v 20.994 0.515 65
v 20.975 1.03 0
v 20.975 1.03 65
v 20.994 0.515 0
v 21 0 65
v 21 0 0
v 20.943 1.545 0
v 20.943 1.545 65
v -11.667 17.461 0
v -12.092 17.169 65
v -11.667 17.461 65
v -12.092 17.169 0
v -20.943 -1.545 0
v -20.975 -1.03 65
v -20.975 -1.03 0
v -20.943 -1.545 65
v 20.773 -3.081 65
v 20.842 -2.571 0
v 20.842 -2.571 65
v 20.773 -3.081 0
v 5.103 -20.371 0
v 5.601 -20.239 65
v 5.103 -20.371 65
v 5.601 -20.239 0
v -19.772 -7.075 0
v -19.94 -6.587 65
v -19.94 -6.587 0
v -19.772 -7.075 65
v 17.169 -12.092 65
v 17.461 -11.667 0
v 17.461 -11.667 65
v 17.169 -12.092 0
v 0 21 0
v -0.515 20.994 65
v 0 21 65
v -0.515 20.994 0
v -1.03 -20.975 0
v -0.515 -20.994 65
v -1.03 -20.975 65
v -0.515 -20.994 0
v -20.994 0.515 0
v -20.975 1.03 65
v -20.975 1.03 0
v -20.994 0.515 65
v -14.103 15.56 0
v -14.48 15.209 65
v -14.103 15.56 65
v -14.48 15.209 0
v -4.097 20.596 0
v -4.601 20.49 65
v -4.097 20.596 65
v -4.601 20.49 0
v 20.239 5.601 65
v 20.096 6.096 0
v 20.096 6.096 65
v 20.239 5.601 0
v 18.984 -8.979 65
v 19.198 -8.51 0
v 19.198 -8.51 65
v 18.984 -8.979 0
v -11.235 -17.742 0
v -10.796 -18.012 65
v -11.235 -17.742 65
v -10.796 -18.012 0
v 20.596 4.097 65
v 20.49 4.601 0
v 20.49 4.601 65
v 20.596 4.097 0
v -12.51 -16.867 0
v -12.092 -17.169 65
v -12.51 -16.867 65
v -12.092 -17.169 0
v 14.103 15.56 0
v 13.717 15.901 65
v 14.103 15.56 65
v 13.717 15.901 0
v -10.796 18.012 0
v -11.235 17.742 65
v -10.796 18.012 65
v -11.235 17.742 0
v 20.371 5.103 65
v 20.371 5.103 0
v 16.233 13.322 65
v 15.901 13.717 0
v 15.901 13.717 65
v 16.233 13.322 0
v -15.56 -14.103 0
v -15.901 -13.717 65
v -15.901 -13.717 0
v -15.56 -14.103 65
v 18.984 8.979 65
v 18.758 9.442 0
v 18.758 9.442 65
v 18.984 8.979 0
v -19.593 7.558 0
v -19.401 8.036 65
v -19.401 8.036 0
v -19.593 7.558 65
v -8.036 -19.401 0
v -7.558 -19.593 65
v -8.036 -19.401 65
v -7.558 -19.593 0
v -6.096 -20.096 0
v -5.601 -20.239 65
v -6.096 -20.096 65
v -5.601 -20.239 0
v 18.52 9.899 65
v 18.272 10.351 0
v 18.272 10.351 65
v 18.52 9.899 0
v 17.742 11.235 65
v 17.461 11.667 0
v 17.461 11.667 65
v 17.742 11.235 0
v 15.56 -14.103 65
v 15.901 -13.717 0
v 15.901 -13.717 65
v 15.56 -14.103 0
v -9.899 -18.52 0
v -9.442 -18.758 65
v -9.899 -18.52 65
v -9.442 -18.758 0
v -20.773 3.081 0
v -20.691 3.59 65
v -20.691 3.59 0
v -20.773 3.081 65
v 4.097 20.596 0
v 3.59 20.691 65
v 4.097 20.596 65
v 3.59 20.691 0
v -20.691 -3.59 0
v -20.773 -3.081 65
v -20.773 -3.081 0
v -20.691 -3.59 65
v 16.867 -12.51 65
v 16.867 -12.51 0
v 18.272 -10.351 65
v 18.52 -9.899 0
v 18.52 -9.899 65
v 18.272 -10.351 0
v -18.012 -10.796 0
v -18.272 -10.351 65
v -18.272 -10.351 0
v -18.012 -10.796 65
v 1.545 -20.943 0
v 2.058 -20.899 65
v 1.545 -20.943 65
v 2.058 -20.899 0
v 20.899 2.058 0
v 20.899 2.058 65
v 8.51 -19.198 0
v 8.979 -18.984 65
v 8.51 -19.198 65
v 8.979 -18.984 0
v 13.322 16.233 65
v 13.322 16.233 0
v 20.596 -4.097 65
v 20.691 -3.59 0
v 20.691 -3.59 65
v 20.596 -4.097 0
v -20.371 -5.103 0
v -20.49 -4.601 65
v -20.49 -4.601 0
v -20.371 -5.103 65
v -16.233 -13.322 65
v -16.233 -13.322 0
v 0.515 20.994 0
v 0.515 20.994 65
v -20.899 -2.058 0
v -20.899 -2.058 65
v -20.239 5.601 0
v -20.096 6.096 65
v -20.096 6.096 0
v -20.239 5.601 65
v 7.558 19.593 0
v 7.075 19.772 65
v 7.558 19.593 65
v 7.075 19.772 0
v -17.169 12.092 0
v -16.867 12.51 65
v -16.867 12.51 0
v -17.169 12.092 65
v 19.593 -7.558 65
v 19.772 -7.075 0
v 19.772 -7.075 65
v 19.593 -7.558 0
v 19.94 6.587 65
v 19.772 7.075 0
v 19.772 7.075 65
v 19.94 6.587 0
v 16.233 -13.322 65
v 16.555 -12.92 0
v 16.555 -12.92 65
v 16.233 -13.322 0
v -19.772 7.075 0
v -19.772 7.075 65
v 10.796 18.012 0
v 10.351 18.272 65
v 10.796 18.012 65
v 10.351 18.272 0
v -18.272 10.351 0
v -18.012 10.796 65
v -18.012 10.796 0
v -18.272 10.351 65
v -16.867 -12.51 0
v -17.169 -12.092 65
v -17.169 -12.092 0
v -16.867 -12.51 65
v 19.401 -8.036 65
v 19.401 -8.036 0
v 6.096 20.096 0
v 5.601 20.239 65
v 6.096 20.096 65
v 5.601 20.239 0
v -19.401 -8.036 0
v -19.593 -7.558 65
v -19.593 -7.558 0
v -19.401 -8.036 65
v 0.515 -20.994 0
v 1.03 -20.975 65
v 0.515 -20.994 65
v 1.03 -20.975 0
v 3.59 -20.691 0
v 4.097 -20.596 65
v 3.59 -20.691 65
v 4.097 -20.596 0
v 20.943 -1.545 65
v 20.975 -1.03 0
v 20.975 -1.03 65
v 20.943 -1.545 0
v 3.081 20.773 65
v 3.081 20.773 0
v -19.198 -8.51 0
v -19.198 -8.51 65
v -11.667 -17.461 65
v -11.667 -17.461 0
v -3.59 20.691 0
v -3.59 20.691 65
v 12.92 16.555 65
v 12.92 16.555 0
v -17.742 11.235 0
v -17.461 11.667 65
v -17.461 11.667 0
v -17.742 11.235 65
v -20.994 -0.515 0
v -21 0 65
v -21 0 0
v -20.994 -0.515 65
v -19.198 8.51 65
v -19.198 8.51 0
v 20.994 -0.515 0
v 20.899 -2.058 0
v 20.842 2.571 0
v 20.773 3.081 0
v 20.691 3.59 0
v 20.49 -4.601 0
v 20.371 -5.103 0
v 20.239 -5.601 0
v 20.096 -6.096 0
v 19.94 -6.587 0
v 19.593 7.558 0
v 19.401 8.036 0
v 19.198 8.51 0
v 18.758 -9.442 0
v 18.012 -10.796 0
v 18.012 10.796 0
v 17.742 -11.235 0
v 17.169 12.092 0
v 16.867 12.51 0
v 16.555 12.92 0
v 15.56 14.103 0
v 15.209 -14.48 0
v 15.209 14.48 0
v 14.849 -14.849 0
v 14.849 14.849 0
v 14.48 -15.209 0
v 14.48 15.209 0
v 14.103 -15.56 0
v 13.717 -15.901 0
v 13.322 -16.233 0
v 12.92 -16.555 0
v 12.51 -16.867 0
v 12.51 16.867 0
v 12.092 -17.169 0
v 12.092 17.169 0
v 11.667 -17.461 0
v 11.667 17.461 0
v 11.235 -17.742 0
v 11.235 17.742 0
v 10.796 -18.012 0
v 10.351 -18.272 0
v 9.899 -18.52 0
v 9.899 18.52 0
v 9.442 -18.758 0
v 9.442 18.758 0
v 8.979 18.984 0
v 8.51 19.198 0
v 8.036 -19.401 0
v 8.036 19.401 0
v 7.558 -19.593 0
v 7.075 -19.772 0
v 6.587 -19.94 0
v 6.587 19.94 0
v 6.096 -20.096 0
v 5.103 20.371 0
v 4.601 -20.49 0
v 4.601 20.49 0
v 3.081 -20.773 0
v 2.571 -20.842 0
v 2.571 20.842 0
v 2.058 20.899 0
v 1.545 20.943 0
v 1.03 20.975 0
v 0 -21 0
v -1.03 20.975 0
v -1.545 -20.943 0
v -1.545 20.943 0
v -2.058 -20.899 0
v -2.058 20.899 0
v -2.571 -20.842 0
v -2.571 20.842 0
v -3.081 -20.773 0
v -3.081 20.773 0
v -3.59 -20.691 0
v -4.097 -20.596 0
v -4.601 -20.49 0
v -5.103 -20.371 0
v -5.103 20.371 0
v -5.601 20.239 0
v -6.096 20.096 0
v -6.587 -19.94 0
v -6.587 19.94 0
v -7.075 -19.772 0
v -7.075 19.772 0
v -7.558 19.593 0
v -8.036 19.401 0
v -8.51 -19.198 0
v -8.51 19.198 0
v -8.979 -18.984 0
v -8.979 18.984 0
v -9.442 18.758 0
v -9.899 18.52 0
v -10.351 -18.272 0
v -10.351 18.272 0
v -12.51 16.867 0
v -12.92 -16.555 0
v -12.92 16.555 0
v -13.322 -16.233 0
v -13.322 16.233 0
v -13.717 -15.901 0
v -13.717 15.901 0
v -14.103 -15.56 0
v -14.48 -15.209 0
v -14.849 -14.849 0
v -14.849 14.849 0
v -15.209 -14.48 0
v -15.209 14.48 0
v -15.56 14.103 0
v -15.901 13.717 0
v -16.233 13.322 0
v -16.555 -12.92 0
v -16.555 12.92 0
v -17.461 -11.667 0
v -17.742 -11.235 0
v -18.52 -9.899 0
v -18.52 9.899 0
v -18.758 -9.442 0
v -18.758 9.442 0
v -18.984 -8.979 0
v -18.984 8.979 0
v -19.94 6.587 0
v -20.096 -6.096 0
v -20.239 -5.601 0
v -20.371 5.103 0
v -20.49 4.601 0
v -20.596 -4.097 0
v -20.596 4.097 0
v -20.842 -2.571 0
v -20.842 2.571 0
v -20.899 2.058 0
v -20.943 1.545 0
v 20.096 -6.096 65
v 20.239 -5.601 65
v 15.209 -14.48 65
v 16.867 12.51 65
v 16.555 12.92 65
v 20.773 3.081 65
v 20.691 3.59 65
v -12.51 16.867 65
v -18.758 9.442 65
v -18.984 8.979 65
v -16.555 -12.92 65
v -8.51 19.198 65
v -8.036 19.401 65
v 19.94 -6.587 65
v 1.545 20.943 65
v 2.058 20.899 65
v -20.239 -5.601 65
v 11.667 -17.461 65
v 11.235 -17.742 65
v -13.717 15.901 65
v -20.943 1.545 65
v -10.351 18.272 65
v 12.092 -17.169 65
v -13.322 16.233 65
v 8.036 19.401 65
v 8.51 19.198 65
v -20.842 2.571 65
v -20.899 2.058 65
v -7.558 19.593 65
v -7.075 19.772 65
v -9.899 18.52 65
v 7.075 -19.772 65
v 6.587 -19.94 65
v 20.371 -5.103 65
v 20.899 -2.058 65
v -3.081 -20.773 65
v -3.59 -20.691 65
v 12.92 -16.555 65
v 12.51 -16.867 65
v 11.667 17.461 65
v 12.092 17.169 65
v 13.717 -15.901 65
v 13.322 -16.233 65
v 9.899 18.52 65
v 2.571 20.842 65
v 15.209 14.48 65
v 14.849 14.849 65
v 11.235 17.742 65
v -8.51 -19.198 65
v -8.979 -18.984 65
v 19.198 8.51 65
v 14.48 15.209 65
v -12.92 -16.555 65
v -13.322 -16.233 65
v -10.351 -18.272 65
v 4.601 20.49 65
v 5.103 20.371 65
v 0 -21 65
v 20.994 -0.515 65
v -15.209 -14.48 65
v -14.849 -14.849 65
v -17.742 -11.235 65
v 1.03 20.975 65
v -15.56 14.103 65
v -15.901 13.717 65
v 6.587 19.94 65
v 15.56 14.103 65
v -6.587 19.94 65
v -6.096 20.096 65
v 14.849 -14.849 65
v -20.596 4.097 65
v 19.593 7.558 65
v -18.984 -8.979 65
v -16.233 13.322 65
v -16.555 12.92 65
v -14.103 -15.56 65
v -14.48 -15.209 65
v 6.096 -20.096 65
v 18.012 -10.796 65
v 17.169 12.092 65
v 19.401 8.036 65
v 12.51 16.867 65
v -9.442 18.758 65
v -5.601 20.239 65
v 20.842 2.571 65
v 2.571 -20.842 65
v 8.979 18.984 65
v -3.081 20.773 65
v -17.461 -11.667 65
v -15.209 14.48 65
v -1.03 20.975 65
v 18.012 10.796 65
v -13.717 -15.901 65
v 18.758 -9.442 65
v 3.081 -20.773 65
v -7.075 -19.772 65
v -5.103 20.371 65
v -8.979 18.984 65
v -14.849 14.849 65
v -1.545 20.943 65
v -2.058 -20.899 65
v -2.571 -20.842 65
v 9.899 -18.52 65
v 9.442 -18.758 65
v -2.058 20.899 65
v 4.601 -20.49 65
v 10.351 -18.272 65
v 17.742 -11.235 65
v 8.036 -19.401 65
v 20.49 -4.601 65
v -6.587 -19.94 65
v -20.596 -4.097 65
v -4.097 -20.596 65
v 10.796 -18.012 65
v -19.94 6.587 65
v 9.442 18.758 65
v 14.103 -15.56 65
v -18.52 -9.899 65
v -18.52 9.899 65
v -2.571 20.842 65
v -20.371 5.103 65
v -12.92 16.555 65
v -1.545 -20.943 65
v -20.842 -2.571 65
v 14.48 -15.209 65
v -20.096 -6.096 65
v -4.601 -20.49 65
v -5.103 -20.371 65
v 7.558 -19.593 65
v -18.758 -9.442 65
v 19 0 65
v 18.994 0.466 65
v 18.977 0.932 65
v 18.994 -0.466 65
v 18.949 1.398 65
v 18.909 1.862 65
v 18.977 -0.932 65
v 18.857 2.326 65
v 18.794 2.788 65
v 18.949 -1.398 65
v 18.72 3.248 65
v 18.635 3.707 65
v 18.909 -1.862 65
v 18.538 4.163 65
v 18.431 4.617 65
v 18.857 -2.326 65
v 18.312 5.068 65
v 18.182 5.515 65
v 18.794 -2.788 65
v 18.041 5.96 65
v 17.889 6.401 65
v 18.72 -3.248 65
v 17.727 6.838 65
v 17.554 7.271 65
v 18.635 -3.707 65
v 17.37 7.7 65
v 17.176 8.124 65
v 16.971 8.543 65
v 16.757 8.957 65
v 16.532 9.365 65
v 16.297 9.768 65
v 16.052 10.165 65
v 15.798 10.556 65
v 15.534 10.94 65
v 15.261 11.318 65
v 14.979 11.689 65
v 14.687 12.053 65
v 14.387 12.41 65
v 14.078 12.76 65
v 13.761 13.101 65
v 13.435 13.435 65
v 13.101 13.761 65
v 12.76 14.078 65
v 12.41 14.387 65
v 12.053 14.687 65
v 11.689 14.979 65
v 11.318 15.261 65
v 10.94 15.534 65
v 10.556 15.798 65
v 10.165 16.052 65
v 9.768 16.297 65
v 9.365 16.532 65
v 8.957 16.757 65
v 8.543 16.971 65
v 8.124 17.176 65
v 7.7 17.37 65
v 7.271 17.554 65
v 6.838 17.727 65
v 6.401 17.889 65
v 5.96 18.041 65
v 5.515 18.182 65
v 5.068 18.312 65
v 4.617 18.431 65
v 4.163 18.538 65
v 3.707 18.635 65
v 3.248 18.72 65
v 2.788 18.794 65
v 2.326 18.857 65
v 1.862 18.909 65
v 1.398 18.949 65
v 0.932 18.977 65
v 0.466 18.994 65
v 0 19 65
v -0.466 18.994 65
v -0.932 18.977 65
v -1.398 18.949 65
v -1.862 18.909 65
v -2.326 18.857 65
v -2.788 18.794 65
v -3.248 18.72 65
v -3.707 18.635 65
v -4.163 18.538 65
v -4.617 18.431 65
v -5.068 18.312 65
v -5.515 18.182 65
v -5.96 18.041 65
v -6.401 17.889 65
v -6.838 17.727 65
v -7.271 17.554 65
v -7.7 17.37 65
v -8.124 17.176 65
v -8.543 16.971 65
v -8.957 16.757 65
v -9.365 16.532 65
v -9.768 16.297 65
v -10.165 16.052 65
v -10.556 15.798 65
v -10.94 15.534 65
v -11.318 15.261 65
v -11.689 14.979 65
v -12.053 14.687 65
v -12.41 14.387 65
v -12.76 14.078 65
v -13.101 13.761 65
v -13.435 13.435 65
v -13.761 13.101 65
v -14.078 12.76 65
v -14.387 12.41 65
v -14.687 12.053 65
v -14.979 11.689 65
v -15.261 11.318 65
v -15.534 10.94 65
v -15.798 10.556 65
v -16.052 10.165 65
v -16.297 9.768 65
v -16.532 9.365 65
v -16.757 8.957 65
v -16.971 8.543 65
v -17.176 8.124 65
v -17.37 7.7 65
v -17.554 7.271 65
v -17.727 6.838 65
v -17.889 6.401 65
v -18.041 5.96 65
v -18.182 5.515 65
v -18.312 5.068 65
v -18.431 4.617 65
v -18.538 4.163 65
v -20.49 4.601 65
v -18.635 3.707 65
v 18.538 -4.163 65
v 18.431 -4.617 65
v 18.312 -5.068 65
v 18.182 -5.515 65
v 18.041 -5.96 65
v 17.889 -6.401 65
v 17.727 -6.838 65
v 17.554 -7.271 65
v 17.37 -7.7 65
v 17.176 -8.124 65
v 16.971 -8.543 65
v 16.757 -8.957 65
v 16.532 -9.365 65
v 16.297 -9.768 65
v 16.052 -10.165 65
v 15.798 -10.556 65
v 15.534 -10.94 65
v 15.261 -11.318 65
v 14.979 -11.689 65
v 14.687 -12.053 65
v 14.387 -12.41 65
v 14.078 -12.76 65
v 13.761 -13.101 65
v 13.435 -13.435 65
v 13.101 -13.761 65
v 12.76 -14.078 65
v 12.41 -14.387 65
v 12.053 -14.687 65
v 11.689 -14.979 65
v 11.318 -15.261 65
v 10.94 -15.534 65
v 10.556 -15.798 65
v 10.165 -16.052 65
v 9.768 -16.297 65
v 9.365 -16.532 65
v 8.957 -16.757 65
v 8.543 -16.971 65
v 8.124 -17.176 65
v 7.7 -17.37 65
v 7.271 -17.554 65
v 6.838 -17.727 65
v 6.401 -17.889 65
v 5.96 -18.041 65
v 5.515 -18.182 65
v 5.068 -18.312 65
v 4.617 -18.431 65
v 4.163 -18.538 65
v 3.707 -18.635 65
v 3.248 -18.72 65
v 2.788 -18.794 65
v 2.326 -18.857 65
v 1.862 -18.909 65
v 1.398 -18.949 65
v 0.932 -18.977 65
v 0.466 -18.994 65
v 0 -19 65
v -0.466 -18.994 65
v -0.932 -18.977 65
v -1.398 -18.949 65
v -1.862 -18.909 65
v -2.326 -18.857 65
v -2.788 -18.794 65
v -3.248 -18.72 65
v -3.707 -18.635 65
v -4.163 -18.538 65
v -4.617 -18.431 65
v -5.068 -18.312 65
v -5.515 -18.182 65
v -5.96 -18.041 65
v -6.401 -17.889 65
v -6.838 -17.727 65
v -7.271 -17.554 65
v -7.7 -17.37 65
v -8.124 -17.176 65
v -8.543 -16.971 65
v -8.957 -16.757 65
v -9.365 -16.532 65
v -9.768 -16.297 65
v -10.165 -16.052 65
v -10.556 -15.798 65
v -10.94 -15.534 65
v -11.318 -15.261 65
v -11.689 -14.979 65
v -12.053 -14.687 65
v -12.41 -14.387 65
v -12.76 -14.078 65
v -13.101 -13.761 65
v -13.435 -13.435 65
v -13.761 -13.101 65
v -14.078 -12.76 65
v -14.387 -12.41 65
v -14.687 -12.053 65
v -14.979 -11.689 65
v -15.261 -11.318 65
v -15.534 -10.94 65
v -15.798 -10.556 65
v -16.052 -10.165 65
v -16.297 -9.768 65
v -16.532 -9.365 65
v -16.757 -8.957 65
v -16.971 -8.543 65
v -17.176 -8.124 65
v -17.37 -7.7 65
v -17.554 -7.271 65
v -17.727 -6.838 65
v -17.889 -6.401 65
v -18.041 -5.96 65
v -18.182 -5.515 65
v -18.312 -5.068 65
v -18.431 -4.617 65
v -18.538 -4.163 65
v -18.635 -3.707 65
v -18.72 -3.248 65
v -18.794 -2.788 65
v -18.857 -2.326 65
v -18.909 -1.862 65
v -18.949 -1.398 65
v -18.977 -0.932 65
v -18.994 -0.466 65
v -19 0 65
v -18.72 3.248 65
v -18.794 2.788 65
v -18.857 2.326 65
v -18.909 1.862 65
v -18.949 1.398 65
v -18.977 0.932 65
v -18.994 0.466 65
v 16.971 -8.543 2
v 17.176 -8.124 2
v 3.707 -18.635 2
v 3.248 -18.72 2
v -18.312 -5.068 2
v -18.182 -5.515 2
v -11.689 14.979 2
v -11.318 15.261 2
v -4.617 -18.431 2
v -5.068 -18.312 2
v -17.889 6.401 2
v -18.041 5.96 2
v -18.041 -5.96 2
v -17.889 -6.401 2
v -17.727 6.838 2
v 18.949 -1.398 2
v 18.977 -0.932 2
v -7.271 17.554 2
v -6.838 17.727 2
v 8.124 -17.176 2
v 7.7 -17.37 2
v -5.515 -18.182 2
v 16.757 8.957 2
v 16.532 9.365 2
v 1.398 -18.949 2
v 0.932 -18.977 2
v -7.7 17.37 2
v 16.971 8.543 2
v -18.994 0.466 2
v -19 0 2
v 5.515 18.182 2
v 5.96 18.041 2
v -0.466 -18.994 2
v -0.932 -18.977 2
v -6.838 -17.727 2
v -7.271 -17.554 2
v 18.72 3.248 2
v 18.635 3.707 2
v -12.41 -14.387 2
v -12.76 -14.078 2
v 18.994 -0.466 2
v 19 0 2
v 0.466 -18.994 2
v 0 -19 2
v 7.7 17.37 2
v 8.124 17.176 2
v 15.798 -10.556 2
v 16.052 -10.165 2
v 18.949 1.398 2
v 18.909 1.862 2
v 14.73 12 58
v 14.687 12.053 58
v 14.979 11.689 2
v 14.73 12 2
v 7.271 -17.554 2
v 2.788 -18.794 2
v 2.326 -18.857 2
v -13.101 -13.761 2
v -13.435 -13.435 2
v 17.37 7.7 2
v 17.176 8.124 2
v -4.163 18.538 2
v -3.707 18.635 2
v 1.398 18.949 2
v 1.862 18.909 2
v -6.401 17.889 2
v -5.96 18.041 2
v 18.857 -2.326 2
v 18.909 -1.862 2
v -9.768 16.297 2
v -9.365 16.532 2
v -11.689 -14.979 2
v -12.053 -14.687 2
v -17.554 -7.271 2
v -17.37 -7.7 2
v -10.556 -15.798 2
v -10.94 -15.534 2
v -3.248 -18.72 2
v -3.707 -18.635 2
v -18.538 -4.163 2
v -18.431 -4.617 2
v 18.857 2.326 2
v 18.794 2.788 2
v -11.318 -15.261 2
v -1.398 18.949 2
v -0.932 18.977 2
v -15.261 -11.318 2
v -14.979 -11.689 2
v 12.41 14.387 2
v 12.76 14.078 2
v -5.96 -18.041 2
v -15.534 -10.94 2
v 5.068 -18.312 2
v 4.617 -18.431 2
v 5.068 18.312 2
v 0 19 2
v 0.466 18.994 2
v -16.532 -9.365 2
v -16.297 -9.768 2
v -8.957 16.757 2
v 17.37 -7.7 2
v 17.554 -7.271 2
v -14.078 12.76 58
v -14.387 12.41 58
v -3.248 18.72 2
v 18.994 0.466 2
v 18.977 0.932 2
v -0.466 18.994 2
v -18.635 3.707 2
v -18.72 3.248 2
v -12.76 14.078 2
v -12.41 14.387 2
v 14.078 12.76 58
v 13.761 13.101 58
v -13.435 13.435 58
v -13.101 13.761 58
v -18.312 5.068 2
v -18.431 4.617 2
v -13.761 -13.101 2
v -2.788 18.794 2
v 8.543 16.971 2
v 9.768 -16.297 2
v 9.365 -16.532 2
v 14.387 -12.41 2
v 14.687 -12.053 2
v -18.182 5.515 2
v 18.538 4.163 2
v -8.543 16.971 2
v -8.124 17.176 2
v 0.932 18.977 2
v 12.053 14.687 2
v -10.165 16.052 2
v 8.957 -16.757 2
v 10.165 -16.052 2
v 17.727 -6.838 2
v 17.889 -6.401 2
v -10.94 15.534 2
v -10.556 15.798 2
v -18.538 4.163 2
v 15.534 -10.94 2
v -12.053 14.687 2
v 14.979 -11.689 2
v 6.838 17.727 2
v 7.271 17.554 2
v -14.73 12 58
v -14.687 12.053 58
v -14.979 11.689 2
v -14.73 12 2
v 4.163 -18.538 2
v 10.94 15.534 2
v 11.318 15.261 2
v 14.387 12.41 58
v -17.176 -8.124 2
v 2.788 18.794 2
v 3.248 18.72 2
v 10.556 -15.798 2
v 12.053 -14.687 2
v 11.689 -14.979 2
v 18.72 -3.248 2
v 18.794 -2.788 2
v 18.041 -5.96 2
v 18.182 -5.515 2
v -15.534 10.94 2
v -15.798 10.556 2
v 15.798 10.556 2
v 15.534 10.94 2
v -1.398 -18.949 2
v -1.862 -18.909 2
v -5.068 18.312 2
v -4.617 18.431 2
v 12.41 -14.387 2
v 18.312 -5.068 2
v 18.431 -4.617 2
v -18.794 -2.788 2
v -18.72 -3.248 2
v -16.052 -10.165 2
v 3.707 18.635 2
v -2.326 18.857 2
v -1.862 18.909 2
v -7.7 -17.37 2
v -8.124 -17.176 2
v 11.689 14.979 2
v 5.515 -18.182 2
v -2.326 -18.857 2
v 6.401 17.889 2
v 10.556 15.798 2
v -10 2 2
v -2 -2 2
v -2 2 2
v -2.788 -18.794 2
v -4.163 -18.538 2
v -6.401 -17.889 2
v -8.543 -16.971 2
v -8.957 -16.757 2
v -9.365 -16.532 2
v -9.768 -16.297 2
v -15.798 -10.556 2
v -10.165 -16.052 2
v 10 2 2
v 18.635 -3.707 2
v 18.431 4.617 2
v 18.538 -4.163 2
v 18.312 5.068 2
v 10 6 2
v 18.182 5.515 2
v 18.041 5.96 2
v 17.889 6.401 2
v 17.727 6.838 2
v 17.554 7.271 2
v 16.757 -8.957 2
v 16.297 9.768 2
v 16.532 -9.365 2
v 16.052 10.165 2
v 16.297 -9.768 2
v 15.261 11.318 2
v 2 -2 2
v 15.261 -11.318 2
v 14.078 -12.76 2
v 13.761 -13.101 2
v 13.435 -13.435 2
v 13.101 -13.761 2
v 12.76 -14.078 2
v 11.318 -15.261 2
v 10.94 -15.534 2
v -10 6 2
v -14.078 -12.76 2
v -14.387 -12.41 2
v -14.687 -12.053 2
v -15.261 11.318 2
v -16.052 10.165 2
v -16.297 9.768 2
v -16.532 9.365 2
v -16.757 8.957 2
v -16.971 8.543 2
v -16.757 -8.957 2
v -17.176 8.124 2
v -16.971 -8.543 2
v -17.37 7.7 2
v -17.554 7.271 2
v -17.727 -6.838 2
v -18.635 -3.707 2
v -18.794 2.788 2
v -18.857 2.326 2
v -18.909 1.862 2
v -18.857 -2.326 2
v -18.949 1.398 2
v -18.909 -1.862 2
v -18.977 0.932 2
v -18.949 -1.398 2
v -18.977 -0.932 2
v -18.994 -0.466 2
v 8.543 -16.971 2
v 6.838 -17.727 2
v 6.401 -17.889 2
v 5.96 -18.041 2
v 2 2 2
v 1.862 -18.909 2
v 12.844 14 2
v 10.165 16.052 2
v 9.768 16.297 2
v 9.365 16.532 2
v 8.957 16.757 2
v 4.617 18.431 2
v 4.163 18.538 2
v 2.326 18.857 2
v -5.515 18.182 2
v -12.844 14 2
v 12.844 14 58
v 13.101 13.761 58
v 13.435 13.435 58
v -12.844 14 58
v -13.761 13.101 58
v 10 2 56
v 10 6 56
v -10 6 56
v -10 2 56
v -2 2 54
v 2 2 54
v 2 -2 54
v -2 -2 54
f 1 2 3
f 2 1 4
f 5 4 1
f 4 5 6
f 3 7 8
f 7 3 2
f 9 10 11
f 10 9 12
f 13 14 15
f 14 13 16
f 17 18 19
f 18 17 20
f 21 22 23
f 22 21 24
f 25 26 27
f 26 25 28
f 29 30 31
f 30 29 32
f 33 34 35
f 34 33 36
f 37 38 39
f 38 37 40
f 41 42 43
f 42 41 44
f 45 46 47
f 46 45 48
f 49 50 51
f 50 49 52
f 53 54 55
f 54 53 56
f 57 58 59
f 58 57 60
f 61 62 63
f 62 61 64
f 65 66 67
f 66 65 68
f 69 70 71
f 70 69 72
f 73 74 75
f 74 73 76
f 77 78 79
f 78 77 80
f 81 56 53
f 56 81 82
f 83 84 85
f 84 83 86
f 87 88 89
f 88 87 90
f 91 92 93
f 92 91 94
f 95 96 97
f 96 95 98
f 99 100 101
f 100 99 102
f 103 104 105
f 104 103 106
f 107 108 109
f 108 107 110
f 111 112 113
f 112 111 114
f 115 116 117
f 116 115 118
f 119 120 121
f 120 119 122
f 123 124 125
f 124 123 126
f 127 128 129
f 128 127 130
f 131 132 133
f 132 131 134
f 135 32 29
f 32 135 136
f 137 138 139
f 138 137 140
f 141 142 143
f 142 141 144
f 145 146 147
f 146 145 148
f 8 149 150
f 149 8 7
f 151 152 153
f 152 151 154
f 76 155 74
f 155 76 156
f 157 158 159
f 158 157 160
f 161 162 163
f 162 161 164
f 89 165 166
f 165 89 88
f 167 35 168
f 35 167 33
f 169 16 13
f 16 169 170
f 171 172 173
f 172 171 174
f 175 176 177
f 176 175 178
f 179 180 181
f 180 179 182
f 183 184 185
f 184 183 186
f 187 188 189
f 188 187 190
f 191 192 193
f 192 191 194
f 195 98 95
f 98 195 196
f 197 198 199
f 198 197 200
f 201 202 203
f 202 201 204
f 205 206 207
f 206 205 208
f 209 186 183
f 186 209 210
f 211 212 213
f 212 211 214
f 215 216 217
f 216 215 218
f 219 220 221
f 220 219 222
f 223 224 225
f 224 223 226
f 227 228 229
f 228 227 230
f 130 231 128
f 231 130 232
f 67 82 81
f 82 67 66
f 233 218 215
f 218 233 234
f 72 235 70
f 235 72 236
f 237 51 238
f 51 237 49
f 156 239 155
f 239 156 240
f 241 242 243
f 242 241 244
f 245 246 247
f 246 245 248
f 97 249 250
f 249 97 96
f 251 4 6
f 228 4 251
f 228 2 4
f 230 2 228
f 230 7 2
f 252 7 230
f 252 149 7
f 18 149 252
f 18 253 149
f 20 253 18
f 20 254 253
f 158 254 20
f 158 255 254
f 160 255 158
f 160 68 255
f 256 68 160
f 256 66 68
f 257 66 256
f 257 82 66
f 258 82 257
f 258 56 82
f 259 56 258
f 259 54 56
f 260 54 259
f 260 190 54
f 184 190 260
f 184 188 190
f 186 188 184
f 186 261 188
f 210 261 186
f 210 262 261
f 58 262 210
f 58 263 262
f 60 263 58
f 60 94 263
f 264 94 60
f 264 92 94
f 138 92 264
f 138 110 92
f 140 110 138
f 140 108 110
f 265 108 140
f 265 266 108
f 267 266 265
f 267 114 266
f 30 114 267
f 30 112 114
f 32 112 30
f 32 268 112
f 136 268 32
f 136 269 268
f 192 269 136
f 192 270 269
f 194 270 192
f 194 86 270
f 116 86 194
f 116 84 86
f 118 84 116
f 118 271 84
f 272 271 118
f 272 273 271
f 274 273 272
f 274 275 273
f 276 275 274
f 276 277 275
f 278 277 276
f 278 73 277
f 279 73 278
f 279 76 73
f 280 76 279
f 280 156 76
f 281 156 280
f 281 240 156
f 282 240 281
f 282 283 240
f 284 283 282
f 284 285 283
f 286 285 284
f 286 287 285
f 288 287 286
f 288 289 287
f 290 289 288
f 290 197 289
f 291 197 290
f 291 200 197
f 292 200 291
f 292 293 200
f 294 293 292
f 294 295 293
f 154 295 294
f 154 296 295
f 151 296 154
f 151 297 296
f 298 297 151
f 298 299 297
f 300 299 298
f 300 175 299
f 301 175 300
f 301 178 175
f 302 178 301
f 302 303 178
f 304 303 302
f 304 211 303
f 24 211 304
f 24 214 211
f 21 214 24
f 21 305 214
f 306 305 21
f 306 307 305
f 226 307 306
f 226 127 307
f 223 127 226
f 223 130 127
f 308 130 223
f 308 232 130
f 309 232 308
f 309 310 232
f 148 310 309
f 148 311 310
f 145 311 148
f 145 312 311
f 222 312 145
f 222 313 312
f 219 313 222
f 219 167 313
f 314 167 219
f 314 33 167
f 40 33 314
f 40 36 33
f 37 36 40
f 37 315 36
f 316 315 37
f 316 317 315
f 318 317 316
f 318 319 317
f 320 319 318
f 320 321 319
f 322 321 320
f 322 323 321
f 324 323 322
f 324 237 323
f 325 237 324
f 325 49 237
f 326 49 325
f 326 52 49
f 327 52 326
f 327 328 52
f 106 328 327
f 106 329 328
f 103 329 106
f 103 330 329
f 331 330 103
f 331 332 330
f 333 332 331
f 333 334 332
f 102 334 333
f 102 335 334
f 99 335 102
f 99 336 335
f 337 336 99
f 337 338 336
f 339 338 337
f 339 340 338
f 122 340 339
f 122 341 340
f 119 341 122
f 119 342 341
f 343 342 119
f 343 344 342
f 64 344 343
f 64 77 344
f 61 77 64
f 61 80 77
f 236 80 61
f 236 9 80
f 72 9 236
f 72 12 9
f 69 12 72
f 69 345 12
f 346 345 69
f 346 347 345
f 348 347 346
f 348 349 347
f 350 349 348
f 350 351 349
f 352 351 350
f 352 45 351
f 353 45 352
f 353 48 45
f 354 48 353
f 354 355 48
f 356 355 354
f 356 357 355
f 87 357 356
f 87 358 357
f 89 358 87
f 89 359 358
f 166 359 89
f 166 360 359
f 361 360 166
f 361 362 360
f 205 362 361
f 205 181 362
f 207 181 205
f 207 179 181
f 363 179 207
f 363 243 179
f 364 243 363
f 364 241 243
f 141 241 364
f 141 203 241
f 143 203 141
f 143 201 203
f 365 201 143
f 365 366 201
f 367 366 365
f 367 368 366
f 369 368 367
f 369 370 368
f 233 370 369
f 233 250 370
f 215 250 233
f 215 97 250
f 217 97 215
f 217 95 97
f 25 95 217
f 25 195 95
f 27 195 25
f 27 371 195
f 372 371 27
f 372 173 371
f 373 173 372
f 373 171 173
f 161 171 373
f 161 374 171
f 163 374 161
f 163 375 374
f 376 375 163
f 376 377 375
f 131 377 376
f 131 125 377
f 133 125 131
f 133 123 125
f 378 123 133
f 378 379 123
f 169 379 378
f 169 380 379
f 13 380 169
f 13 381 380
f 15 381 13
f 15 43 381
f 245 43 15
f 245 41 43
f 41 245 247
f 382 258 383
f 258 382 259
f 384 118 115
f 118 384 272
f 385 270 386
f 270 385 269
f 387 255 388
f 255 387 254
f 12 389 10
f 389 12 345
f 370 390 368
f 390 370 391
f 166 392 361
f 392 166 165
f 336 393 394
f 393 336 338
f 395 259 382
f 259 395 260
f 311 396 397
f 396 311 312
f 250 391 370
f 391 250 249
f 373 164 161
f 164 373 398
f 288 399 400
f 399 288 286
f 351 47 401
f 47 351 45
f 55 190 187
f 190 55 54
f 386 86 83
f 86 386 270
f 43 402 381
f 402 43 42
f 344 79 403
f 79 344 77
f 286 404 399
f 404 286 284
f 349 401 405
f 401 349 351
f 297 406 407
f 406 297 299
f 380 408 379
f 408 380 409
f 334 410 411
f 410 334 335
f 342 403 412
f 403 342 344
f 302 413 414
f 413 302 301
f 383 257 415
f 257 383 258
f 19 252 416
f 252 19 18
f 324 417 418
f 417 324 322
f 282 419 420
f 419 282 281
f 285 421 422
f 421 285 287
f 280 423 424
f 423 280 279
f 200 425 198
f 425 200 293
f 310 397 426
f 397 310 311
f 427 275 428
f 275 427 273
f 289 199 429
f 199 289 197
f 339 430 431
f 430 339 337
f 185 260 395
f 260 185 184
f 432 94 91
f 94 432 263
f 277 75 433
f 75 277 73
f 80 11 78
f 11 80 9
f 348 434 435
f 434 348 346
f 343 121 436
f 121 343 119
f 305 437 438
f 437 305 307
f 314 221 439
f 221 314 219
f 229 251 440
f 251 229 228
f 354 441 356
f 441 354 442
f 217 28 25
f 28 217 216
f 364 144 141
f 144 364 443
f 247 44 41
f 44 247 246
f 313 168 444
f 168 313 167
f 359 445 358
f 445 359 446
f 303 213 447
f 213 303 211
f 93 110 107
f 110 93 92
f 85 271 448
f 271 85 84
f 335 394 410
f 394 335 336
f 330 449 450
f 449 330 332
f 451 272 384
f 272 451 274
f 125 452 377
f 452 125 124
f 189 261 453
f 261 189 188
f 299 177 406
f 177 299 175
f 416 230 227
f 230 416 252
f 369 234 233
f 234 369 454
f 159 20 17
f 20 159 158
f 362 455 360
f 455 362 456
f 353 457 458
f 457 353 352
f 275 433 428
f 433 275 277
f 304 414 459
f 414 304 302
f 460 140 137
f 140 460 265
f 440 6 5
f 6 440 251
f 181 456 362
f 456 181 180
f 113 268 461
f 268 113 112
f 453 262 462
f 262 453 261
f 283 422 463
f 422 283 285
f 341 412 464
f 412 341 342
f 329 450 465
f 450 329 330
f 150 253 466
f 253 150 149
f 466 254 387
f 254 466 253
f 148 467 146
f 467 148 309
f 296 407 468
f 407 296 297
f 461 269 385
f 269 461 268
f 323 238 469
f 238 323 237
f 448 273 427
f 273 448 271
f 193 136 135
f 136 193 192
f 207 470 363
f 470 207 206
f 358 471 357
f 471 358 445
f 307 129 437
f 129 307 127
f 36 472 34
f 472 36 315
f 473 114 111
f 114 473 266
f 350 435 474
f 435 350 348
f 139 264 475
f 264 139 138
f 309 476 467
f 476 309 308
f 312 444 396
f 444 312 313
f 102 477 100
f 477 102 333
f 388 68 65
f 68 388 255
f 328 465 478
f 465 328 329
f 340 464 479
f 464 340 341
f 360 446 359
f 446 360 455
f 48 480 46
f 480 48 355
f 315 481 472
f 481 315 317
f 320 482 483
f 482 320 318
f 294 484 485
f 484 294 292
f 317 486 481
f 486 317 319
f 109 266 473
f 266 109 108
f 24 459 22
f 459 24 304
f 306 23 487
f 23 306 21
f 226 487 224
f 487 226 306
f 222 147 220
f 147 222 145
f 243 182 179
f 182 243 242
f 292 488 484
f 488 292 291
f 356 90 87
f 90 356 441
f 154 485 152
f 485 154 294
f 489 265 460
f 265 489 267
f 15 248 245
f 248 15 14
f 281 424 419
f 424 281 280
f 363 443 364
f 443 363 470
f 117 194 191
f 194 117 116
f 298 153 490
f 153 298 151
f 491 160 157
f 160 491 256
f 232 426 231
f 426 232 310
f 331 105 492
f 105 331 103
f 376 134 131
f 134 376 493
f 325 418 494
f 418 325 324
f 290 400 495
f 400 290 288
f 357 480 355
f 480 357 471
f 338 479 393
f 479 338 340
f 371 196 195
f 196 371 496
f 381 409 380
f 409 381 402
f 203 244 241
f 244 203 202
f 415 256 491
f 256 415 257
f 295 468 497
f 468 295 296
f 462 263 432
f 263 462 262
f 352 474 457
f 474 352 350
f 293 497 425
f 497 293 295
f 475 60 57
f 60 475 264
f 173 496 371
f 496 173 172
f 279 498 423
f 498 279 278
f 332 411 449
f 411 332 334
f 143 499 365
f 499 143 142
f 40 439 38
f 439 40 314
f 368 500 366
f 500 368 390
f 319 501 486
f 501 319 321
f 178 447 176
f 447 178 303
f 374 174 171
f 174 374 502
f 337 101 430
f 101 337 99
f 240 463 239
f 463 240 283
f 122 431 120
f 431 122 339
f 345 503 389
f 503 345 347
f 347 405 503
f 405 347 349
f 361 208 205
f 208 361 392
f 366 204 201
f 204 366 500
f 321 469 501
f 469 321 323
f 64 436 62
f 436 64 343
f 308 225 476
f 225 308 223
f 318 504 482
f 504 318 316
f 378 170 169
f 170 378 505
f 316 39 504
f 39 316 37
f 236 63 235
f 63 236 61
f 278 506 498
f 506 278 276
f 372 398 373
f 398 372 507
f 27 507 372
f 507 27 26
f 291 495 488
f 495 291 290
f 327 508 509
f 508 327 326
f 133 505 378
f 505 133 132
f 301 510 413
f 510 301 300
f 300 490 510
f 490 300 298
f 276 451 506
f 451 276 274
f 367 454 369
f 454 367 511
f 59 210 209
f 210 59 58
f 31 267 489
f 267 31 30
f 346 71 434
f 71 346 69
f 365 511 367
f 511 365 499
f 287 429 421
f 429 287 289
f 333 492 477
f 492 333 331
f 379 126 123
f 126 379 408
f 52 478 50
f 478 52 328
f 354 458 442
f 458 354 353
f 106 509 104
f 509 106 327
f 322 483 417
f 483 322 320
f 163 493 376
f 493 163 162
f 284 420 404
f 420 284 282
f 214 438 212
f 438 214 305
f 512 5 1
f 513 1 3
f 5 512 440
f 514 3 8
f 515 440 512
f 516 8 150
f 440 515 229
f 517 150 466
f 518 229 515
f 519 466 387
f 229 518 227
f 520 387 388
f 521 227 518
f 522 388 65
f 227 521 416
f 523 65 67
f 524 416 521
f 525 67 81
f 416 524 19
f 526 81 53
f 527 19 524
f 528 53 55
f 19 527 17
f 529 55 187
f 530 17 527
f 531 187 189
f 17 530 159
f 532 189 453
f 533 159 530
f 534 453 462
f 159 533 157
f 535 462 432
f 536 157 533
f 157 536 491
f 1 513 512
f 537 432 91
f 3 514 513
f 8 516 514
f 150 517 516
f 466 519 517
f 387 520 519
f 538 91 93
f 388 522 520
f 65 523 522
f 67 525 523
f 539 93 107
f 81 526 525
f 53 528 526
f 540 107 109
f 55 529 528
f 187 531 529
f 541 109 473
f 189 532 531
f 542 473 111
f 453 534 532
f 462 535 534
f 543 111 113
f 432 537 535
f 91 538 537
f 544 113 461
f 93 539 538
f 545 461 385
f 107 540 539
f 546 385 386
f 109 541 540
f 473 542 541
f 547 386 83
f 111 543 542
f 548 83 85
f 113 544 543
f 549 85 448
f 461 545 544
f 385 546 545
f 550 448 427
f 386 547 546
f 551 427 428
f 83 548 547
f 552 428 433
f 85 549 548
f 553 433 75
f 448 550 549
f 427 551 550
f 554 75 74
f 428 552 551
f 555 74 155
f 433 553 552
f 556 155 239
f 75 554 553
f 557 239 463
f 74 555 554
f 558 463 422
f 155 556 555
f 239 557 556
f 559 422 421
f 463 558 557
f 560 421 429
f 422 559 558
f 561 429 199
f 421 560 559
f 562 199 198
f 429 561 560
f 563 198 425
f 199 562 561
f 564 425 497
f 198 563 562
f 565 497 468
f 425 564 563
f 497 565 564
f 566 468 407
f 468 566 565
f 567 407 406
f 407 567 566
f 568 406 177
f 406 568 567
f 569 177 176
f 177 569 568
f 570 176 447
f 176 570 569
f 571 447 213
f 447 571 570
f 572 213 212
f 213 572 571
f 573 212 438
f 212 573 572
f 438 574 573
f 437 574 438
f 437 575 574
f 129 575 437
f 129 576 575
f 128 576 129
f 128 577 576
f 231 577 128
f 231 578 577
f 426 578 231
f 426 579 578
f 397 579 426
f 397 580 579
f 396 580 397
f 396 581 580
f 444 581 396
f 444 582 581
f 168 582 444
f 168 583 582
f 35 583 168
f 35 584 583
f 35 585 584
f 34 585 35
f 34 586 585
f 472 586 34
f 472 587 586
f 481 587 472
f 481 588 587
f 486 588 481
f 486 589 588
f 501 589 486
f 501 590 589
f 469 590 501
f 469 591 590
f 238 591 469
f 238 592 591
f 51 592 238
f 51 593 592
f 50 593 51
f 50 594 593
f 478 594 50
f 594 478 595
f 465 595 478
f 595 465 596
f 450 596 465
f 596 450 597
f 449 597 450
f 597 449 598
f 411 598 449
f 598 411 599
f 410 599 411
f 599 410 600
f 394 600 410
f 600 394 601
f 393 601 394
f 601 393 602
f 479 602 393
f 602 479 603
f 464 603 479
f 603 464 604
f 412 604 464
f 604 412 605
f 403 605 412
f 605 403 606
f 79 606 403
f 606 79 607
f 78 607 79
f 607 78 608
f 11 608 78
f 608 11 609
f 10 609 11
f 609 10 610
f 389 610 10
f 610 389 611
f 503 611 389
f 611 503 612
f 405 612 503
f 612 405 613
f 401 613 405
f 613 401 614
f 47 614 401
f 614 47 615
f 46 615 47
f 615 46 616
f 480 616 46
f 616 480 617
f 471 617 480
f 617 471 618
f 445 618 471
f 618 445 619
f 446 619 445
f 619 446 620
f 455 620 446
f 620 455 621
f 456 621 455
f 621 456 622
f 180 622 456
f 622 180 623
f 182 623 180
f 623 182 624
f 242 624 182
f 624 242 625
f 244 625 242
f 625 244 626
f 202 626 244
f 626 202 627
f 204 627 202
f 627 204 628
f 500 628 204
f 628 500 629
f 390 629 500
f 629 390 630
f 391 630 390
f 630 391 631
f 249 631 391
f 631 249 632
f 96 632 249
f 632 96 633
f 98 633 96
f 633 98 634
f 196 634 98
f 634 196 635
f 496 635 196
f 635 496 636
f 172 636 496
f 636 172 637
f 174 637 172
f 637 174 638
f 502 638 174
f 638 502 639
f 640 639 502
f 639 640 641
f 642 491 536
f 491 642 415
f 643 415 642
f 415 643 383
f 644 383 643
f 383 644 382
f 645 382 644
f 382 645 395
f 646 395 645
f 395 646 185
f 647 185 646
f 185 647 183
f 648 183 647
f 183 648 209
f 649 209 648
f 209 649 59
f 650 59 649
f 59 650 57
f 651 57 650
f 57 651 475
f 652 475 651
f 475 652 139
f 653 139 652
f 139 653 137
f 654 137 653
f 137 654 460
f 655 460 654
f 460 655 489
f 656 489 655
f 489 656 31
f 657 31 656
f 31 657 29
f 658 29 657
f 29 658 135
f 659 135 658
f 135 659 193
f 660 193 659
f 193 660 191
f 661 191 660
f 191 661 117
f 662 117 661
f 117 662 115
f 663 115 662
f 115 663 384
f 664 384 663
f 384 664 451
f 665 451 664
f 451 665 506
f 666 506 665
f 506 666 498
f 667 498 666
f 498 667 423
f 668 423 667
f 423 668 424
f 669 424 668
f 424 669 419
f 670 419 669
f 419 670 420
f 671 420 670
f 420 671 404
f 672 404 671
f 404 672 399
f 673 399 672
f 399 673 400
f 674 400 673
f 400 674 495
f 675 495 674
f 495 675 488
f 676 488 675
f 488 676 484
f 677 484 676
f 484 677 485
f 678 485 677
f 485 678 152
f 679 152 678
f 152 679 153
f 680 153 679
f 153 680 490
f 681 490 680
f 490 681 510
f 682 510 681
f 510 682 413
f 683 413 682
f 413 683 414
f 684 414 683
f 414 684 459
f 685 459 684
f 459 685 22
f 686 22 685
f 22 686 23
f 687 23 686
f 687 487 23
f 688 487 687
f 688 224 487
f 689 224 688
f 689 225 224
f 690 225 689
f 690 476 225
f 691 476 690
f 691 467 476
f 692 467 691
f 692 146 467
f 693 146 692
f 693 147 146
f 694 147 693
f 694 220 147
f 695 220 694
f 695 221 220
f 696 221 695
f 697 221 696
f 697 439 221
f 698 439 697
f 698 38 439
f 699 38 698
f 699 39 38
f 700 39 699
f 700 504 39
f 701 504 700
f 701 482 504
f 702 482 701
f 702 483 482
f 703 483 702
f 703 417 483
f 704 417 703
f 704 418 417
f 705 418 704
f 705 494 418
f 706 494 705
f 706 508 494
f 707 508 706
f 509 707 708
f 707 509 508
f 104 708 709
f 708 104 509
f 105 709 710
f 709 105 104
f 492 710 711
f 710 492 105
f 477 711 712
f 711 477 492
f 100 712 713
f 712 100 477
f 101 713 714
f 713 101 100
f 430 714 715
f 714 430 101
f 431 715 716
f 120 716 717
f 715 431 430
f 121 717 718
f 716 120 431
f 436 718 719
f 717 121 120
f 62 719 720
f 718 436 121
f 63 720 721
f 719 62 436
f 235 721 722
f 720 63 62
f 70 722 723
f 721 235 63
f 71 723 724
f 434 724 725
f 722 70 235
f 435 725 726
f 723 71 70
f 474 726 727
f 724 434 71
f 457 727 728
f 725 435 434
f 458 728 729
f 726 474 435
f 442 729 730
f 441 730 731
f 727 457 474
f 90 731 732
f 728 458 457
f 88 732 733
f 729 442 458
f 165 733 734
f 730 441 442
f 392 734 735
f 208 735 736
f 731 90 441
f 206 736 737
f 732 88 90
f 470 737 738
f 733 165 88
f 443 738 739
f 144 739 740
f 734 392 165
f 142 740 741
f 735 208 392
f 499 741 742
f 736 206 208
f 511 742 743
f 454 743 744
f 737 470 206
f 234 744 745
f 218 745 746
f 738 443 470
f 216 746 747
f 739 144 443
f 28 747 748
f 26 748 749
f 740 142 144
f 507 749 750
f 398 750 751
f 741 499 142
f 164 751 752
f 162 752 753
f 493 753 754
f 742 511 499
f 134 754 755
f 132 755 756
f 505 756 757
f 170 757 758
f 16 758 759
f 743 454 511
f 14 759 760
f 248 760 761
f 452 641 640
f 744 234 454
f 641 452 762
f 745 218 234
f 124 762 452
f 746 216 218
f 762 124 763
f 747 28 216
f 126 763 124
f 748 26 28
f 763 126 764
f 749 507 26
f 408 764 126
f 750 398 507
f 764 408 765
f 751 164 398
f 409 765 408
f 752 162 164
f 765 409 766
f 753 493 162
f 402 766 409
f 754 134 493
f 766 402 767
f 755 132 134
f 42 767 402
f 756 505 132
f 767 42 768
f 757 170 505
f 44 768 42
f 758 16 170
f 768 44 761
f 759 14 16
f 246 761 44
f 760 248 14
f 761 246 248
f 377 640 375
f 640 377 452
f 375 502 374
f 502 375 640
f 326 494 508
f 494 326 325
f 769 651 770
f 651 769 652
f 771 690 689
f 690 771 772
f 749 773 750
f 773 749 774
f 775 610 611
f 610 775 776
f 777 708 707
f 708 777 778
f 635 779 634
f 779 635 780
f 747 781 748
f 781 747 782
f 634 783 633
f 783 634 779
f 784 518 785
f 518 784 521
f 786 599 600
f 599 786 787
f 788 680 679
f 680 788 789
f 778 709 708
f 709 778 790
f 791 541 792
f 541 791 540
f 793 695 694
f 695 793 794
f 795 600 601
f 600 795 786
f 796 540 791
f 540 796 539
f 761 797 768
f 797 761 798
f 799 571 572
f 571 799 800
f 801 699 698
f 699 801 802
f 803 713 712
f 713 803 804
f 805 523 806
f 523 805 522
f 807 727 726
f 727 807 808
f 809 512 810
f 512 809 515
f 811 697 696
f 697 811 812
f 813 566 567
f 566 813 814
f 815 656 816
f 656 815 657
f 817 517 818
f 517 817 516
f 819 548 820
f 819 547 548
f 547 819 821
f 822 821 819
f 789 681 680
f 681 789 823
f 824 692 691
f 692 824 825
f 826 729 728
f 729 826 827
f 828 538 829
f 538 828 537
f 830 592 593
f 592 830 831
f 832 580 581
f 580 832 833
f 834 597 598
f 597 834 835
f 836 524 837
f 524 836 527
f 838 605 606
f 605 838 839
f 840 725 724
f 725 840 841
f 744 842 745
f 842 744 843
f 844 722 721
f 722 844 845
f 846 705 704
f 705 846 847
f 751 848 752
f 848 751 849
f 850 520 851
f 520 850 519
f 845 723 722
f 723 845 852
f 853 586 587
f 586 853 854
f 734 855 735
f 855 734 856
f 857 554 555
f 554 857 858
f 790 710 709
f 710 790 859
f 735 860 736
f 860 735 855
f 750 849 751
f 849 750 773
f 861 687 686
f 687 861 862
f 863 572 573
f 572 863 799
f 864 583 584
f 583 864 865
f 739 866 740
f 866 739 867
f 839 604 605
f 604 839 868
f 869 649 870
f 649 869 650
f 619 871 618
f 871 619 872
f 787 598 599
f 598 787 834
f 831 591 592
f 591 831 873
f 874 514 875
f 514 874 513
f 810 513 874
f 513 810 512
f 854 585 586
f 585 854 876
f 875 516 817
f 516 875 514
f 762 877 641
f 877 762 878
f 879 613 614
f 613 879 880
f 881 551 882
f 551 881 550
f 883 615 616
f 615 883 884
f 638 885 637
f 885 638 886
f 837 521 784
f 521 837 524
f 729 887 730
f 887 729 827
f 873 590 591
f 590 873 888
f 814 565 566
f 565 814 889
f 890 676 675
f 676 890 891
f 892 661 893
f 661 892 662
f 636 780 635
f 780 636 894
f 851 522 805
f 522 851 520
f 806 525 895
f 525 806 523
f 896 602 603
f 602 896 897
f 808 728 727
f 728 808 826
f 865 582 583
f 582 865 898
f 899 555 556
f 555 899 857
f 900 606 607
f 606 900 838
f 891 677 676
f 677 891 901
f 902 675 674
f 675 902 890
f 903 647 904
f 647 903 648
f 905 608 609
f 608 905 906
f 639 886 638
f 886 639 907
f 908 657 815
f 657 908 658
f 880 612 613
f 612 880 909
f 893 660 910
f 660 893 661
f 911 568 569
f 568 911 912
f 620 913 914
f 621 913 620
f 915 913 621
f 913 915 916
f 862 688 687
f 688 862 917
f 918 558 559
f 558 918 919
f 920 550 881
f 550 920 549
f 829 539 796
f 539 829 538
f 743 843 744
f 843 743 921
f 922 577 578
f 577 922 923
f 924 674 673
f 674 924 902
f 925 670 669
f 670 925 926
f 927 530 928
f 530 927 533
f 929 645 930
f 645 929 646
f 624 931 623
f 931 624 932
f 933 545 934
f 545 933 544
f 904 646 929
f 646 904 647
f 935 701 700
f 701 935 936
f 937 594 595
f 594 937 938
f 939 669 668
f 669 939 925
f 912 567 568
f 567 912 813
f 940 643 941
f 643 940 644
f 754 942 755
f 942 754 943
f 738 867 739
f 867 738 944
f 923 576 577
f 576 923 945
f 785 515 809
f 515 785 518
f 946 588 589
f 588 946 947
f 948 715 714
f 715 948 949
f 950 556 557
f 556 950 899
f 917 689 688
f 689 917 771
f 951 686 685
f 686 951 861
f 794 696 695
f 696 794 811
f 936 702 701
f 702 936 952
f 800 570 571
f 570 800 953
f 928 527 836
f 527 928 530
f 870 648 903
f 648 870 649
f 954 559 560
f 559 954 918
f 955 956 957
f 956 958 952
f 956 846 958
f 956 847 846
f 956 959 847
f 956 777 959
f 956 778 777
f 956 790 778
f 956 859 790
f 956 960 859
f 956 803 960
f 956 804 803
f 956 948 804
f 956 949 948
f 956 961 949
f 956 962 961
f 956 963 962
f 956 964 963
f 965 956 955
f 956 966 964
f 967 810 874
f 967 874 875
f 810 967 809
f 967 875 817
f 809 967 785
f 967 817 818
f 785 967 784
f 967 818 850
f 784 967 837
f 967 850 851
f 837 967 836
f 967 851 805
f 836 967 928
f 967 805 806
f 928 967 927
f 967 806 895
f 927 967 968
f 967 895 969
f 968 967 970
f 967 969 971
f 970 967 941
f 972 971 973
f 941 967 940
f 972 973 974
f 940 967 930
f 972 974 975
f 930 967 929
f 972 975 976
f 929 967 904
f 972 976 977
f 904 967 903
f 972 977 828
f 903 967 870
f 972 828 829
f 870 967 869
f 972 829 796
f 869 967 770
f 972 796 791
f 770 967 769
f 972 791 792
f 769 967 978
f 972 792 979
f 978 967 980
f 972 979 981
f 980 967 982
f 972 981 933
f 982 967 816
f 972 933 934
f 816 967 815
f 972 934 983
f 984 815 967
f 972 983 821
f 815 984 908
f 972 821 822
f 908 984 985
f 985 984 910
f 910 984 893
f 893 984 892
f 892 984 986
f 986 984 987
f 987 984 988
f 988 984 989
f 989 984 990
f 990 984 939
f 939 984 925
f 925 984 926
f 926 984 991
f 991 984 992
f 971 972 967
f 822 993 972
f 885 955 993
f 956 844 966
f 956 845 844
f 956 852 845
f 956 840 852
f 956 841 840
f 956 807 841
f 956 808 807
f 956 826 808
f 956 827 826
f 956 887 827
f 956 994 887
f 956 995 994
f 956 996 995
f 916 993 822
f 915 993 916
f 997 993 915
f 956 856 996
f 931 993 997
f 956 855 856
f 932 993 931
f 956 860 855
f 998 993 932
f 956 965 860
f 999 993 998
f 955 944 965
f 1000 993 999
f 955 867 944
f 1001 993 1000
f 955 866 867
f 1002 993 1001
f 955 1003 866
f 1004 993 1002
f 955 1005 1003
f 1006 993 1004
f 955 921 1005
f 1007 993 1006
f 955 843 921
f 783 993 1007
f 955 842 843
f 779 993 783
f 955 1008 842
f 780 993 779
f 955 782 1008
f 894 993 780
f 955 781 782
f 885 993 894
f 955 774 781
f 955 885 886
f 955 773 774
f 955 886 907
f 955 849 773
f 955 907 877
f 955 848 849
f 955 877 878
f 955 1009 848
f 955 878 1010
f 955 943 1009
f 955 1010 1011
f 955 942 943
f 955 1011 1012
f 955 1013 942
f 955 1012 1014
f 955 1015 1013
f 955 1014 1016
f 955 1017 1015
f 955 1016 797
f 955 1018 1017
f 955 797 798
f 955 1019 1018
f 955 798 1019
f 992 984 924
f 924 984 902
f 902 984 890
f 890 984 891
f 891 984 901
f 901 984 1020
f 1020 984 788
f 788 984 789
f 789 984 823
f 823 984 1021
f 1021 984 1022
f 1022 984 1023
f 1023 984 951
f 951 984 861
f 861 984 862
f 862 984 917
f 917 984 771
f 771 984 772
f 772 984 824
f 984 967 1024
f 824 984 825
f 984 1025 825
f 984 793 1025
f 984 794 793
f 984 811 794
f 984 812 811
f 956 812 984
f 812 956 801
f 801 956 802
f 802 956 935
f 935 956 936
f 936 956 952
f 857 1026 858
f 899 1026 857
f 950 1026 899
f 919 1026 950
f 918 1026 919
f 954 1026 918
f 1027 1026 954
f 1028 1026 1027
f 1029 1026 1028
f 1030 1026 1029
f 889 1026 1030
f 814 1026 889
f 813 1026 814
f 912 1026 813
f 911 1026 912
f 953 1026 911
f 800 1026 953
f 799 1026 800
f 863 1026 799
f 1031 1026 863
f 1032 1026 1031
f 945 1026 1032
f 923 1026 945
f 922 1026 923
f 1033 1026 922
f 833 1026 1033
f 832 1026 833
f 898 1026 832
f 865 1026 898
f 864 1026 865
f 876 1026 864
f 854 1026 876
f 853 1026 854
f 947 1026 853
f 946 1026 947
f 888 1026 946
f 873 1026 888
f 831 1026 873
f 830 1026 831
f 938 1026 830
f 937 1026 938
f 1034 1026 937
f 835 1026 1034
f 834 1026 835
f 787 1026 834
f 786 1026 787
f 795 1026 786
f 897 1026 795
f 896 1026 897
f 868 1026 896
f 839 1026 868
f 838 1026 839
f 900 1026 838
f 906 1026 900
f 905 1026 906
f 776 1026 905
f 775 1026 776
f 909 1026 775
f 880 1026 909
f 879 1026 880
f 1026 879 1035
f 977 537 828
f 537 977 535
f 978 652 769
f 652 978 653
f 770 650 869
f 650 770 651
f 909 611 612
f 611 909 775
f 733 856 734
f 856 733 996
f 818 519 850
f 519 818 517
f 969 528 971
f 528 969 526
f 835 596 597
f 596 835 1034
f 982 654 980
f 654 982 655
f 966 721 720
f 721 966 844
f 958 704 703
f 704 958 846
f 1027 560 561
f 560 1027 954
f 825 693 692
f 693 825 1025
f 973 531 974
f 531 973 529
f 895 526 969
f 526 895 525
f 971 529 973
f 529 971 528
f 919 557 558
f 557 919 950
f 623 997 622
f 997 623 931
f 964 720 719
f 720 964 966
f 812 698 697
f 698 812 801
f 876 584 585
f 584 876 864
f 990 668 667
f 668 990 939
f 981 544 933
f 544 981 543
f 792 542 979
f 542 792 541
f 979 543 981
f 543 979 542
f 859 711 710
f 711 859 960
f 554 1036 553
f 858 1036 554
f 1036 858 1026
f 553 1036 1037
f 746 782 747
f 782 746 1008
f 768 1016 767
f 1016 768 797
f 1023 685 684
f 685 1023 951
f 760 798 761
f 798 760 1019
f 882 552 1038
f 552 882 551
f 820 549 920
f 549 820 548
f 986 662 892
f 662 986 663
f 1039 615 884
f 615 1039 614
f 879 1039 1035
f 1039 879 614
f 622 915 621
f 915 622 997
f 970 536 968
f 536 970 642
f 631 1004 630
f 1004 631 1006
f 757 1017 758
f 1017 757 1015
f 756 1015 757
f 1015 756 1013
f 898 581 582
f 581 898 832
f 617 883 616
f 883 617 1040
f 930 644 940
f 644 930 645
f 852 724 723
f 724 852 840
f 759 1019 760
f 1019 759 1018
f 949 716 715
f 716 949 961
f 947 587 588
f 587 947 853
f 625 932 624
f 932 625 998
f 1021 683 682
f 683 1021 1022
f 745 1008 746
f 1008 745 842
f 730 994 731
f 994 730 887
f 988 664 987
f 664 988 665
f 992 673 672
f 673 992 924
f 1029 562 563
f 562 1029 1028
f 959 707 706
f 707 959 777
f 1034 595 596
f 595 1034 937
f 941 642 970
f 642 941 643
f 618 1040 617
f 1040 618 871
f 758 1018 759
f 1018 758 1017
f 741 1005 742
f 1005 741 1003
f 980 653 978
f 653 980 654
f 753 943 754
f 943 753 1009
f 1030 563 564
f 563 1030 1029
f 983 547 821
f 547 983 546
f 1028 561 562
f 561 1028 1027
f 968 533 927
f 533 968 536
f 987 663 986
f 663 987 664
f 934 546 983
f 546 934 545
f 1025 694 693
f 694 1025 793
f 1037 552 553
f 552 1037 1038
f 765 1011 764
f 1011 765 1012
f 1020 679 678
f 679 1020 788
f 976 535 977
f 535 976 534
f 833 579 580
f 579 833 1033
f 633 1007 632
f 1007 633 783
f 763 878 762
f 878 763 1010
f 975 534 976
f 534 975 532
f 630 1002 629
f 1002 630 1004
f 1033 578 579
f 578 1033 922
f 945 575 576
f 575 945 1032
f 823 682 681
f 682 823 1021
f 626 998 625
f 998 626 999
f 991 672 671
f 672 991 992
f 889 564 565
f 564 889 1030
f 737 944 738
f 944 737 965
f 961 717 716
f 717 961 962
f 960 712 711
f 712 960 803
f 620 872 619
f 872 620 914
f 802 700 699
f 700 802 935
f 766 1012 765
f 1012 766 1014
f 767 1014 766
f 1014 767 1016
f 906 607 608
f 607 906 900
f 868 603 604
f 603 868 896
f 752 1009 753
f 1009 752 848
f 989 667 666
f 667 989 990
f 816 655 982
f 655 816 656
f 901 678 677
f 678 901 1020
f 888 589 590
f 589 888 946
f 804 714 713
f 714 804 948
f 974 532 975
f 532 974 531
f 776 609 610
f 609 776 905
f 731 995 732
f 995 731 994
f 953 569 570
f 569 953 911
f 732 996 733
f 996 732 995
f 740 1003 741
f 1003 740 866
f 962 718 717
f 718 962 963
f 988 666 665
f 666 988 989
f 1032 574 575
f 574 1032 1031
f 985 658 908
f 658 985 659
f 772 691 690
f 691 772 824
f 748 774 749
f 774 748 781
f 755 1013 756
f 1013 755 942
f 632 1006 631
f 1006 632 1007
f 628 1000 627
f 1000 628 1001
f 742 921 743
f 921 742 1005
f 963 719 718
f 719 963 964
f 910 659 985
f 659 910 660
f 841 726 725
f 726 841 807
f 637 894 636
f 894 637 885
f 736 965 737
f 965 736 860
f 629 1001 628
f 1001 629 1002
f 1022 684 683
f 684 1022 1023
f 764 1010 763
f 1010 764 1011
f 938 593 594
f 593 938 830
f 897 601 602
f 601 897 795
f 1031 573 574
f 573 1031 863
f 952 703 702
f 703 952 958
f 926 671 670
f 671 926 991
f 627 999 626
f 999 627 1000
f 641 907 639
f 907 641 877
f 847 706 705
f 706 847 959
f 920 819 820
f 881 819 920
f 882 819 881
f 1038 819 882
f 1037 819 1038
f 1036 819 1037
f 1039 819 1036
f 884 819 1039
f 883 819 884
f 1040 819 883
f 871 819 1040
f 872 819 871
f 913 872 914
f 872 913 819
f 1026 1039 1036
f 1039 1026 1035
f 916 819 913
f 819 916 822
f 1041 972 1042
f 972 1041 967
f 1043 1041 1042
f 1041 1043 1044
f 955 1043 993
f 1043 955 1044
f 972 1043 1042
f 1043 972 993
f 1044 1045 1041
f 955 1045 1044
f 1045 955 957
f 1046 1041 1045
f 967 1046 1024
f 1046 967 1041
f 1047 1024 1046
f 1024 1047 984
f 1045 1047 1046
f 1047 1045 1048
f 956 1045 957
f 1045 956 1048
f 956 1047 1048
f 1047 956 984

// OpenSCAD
$fn= $preview ? 32 : 256;
d_max = 42;
h_max = 65;
esp_x = 56;
esp_y = 28;
esp_z = 14;
esp_inner_pin_y = 20;
esp_inner_pin_z = 6;
wall_thickness = 2;
space = 1;

outerCylinder();
translate([(esp_y + 2* space)/-2, d_max/2 - 2*wall_thickness - 5, wall_thickness]) espClip();

module espClip() {
    cube([esp_y + 2* space, wall_thickness, esp_x]);
    translate([(esp_y - esp_inner_pin_y)/2 + space, (esp_inner_pin_z + 2* wall_thickness) * -1, 0]) cube([esp_inner_pin_y, wall_thickness*2, esp_x - wall_thickness]);
    translate([esp_y/2 + space -wall_thickness, (esp_inner_pin_z + 4* wall_thickness) * -1, 0]) cube([wall_thickness*2, wall_thickness*2, esp_x - 2*wall_thickness]);
}

module outerCylinder() {
    difference() {
        cylinder(h=h_max, d=d_max);
        translate([0, 0, wall_thickness]) cylinder(h=h_max - wall_thickness , d=d_max - 2* wall_thickness );
    }

}
